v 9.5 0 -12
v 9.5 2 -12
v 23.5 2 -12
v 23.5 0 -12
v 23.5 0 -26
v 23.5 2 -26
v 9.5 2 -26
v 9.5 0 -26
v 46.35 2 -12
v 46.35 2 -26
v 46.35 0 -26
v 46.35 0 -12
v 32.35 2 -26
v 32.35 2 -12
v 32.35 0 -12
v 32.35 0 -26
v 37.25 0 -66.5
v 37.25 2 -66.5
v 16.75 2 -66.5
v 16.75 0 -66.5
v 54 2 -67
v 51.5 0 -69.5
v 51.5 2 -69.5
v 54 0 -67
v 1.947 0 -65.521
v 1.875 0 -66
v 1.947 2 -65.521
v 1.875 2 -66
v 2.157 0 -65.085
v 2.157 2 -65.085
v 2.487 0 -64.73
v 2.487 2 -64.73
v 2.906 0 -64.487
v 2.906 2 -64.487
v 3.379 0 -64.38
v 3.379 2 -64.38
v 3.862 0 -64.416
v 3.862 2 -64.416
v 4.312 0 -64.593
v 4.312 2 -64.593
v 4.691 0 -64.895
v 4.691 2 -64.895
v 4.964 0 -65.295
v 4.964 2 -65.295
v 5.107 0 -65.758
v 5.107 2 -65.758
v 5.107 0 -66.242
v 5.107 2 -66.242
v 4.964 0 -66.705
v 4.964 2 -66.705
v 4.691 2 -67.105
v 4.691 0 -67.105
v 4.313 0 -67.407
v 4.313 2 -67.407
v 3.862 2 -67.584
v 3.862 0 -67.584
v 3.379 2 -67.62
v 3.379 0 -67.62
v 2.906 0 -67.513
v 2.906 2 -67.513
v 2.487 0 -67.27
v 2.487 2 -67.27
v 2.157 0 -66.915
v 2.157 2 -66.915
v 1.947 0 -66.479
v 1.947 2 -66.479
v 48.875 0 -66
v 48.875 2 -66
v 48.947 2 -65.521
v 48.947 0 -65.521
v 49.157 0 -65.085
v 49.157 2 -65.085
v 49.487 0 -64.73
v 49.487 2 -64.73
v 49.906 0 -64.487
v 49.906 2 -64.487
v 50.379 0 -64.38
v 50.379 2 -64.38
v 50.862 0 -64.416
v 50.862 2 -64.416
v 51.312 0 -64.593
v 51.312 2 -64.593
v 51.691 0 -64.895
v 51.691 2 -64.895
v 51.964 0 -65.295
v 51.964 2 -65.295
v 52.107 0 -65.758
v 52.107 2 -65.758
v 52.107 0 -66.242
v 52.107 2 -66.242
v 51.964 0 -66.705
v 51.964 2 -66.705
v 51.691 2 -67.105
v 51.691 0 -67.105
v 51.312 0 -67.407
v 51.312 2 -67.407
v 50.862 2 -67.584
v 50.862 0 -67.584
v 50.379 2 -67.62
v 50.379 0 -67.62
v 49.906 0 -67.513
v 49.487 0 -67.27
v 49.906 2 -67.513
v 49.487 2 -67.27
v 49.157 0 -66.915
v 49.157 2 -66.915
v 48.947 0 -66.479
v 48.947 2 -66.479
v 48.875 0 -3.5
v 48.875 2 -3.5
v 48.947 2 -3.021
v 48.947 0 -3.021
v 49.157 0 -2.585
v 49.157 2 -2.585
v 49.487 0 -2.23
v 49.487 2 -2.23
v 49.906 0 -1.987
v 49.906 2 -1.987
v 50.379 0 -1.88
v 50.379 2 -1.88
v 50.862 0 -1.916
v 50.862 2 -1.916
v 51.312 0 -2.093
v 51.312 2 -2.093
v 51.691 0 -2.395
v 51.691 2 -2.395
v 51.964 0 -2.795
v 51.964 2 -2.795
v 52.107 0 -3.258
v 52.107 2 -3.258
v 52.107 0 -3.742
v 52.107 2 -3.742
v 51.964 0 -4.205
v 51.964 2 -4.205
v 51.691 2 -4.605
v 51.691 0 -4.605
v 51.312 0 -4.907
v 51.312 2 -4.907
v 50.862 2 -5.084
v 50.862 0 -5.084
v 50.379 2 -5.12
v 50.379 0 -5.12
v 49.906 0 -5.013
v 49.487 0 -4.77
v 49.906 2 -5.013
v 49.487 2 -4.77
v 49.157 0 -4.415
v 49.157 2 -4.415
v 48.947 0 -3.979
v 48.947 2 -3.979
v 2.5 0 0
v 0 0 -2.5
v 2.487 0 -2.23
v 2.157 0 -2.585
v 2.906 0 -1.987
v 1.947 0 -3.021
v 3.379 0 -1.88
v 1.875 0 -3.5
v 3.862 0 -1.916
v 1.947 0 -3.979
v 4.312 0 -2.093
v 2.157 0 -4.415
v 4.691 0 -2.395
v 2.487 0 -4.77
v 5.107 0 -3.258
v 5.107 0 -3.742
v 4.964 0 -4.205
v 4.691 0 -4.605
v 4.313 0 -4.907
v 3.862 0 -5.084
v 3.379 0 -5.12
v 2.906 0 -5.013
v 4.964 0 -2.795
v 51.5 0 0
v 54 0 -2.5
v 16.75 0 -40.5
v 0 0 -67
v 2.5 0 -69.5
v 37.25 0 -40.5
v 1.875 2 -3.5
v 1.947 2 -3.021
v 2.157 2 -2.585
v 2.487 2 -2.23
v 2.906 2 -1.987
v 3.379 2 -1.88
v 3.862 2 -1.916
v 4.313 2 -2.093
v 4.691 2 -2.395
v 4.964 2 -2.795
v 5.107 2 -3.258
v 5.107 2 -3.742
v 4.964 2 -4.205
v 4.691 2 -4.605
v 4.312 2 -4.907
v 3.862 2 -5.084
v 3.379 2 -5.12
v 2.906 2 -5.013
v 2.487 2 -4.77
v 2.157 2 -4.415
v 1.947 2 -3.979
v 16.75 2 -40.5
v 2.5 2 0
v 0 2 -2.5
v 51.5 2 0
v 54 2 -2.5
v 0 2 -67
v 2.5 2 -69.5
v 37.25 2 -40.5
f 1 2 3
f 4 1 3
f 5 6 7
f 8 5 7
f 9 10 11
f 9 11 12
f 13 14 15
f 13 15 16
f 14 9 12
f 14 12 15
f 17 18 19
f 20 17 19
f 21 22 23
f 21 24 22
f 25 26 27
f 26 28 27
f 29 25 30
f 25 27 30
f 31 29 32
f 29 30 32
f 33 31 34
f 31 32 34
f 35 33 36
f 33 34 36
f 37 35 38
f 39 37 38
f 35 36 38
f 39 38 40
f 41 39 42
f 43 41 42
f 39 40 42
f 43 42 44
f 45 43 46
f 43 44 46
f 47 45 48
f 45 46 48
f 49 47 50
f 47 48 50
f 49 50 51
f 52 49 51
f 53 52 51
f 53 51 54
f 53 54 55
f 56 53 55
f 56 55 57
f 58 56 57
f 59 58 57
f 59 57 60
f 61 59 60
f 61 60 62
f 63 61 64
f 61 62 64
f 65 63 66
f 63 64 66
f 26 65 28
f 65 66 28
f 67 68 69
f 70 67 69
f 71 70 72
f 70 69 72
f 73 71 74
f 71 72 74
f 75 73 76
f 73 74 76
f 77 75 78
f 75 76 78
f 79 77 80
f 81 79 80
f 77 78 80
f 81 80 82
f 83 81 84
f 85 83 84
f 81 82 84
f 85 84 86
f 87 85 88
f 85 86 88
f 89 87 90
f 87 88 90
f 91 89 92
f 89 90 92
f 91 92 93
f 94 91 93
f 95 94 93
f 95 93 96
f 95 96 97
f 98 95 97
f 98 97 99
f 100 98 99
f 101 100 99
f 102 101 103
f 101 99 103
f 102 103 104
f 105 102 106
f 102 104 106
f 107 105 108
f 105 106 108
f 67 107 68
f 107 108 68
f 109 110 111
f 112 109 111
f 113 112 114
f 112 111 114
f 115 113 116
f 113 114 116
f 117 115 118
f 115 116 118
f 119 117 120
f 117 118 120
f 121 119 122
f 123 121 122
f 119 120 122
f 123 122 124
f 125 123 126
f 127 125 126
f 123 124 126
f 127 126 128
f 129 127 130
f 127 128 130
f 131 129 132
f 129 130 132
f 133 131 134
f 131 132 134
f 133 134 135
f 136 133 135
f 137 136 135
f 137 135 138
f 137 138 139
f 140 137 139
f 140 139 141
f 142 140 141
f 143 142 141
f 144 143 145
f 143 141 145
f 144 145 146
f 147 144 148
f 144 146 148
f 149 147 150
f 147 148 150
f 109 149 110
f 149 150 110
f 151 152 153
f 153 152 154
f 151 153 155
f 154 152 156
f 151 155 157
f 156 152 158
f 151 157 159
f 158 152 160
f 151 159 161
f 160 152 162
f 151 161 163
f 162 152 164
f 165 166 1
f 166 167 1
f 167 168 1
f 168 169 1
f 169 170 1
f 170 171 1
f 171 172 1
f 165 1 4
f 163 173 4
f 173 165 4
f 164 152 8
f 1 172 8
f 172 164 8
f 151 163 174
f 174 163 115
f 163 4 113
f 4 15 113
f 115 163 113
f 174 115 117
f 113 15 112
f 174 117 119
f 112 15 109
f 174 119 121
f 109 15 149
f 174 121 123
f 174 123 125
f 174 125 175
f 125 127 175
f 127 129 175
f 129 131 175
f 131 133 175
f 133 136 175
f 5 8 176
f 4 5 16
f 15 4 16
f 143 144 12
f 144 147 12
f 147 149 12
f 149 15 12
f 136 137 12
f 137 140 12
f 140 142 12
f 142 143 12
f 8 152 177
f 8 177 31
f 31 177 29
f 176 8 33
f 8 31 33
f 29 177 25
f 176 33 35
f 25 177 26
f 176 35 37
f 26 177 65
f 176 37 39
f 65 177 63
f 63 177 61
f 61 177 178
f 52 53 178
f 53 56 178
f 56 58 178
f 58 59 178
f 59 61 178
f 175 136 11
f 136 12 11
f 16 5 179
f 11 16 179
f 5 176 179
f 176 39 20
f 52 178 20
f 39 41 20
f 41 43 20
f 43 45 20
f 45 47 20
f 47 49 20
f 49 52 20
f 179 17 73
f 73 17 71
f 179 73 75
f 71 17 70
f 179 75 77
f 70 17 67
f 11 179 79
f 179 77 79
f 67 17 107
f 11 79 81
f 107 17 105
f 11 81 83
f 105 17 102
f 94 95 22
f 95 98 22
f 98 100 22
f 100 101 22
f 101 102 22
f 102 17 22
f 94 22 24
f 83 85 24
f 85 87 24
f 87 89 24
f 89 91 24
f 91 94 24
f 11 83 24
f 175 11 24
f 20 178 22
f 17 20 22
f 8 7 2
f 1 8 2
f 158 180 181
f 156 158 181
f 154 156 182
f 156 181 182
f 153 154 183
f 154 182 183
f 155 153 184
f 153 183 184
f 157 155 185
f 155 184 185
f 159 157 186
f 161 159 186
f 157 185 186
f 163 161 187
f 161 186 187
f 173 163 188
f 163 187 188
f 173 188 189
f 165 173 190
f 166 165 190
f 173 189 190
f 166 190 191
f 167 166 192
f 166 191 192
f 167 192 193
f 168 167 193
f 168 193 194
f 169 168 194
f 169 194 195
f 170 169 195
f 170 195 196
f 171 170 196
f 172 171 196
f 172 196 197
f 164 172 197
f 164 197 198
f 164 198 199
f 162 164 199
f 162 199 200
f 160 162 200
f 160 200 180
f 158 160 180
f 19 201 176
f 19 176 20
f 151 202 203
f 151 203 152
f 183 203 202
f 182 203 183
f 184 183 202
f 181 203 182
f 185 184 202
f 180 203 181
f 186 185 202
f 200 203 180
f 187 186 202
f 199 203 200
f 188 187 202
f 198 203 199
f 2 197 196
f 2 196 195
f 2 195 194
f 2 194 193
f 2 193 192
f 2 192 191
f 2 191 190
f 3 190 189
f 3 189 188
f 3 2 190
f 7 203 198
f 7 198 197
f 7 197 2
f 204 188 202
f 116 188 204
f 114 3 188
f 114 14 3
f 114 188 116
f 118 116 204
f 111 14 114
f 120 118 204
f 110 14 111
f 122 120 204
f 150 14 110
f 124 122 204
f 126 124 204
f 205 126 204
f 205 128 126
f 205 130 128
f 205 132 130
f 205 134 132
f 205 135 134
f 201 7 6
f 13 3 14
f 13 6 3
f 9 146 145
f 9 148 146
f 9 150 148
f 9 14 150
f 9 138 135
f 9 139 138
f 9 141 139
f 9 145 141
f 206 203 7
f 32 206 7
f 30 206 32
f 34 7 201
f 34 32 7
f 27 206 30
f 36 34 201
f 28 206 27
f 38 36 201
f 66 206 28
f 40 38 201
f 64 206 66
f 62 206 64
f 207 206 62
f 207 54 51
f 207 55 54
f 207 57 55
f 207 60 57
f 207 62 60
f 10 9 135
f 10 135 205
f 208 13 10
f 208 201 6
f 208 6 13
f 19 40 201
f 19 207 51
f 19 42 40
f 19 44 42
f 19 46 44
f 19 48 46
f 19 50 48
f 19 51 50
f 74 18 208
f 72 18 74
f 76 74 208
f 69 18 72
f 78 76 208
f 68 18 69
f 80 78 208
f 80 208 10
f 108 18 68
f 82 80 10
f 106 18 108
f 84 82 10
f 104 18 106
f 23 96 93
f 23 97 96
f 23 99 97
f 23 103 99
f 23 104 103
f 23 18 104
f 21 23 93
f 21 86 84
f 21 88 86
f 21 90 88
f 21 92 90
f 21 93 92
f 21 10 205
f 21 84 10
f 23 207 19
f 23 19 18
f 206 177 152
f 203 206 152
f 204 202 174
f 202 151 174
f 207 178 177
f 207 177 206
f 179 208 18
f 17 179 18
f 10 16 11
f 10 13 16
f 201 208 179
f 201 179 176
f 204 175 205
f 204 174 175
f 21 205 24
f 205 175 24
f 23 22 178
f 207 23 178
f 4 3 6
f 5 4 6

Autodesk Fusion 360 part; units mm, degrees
sketch "Sketch1" plane through (0, 0, 0) normal (0, 1, 0) x (1, 0, 0)
  line L0 (0, 0) -> (54, 0)
  line L1 (54, 0) -> (54, 69.5)
  line L2 (54, 69.5) -> (0, 69.5)
  line L3 (0, 69.5) -> (0, 0)
  dimension "d1" = 54
  dimension "d2" = 69.5
extrude "Extrude1" add sketch "Sketch1" along normal blind 2
chamfer "Chamfer1" distance 2.5 angle 45 4 edges at (54, 1, 0) (0, 1, 0) (54, 1, -69.5) (0, 1, -69.5)
sketch "Sketch2" plane through (0, 2, 0) normal (0, 1, 0) x (-1, 0, 0)
  line L0 (-2.5, -69.5) -> (0, -67)
  line L1 (0, -67) -> (0, -2.5)
  line L2 (0, -2.5) -> (-2.5, 0)
  line L3 (-2.5, 0) -> (-51.5, 0)
  line L4 (-51.5, 0) -> (-54, -2.5)
  line L5 (-54, -2.5) -> (-54, -67)
  line L6 (-54, -67) -> (-51.5, -69.5)
  line L7 (-51.5, -69.5) -> (-2.5, -69.5)
  line L8 (0, 0) -> (-3.5, 0)
  line L9 (-3.5, 0) -> (-3.5, -3.5)
  circle A0 centre (-3.5, -3.5) radius 1.625
  line L10 (-27, 0) -> (-27, -69.5)
  line L11 (0, -34.75) -> (-54, -34.75)
  circle A1 centre (-50.5, -3.5) radius 1.625
  circle A2 centre (-3.5, -66) radius 1.625
  circle A3 centre (-50.5, -66) radius 1.625
  dimension "d6" = 3.5
  dimension "d7" = 3.5
  dimension "d8" = 3.25
extrude "Extrude2" cut sketch "Sketch2" against normal blind 5 contours A0 | A1 | A2 | A3
sketch "Sketch3" plane through (0, 2, 0) normal (0, 1, 0) x (-1, 0, 0)
  circle A0 centre (-50.5, -3.5) radius 1.625
  circle A1 centre (-50.5, -66) radius 1.625
  circle A2 centre (-3.5, -3.5) radius 1.625
  circle A3 centre (-3.5, -66) radius 1.625
  line L0 (-2.5, -69.5) -> (0, -67)
  line L1 (0, -67) -> (0, -2.5)
  line L2 (0, -2.5) -> (-2.5, 0)
  line L3 (-2.5, 0) -> (-51.5, 0)
  line L4 (-51.5, 0) -> (-54, -2.5)
  line L5 (-54, -2.5) -> (-54, -67)
  line L6 (-54, -67) -> (-51.5, -69.5)
  line L7 (-51.5, -69.5) -> (-2.5, -69.5)
  line L8 (0, 0) -> (-16.5, 0)
  line L9 (-16.5, 0) -> (-16.5, -19)
  line L10 (-16.5, -19) -> (-39.35, -19)
  line L11 (-9.5, -12) -> (-23.5, -12)
  line L12 (-23.5, -12) -> (-23.5, -26)
  line L13 (-23.5, -26) -> (-9.5, -26)
  line L14 (-9.5, -26) -> (-9.5, -12)
  line L15 (-9.5, -12) -> (-23.5, -26) construction
  line L16 (-23.5, -12) -> (-9.5, -26) construction
  line L17 (-32.35, -26) -> (-46.35, -26)
  line L18 (-46.35, -26) -> (-46.35, -12)
  line L19 (-46.35, -12) -> (-32.35, -12)
  line L20 (-32.35, -12) -> (-32.35, -26)
  line L21 (-32.35, -26) -> (-46.35, -12) construction
  line L22 (-46.35, -26) -> (-32.35, -12) construction
  line L23 (0, 0) -> (-28.25, 0)
  line L24 (-28.25, 0) -> (-28.25, -40.5)
  line L25 (-28.25, -40.5) -> (-28.25, -66.5)
  line L26 (0, 0) -> (-18.25, 0)
  line L27 (-18.25, 0) -> (-18.25, -52)
  line L28 (-18.25, -52) -> (-16.75, -52)
  line L29 (-16.75, -52) -> (-28.25, -52)
  line L30 (-28.25, -52) -> (-28.25, -66.5)
  line L31 (-28.25, -66.5) -> (-16.75, -66.5)
  line L32 (-16.75, -66.5) -> (-16.75, -52)
  line L33 (-16.75, -52) -> (-28.25, -52)
  line L34 (-28.25, -52) -> (-28.25, -40.5)
  line L35 (-28.25, -40.5) -> (-16.75, -40.5)
  line L36 (-16.75, -40.5) -> (-16.75, -52)
  line L37 (0, 0) -> (-35.75, 0)
  line L38 (-35.75, 0) -> (-35.75, -44.5)
  line L39 (-35.75, -44.5) -> (-37.25, -44.5)
  line L40 (-37.25, -44.5) -> (-28.25, -44.5)
  line L41 (-28.25, -44.5) -> (-28.25, -40.5)
  line L42 (-28.25, -40.5) -> (-37.25, -40.5)
  line L43 (-37.25, -40.5) -> (-37.25, -44.5)
  line L44 (-37.25, -44.5) -> (-28.25, -44.5)
  line L45 (-28.25, -44.5) -> (-28.25, -66.5)
  line L46 (-28.25, -66.5) -> (-37.25, -66.5)
  line L47 (-37.25, -66.5) -> (-37.25, -44.5)
  point P0 (-16.5, -19)
  point P1 (-39.35, -19)
  dimension "d11" = 16.5
  dimension "d12" = 19
  dimension "d13" = 22.85
  dimension "d14" = 14
  dimension "d15" = 14
  dimension "d16" = 14
  dimension "d17" = 14
  dimension "d18" = 28.25
  dimension "d19" = 40.5
  dimension "d20" = 26
  dimension "d21" = 18.25
  dimension "d22" = 52
  dimension "d23" = 1.5
  dimension "d24" = 35.75
  dimension "d25" = 44.5
  dimension "d26" = 1.5
extrude "Extrude3" cut sketch "Sketch3" against normal blind 2 contours L9 L10 L11 L13 L14 L27 | L9 L10 L11 L27 | L10 L11 L12 L27 | L17 L18 L19 L38 | L10 L19 L20 L38 | L10 L12 L13 L27 | L10 L17 L20 L38 | L25 L27 L29 L33 L34 L35 L41 L45 | L25 L34 L38 L40 L41 L42 L44 | L25 L30 L34 L39 L40 L44 L45 L46 L47 | L27 L28 L29 L33 L35 L36 | L38 L39 L40 L42 L43 L44 | L25 L28 L29 L30 L31 L32 L33 L45
equation "d13 = 39.35 mm - 16.5 mm"
equation "d19 = 42 mm - 1.5 mm"
